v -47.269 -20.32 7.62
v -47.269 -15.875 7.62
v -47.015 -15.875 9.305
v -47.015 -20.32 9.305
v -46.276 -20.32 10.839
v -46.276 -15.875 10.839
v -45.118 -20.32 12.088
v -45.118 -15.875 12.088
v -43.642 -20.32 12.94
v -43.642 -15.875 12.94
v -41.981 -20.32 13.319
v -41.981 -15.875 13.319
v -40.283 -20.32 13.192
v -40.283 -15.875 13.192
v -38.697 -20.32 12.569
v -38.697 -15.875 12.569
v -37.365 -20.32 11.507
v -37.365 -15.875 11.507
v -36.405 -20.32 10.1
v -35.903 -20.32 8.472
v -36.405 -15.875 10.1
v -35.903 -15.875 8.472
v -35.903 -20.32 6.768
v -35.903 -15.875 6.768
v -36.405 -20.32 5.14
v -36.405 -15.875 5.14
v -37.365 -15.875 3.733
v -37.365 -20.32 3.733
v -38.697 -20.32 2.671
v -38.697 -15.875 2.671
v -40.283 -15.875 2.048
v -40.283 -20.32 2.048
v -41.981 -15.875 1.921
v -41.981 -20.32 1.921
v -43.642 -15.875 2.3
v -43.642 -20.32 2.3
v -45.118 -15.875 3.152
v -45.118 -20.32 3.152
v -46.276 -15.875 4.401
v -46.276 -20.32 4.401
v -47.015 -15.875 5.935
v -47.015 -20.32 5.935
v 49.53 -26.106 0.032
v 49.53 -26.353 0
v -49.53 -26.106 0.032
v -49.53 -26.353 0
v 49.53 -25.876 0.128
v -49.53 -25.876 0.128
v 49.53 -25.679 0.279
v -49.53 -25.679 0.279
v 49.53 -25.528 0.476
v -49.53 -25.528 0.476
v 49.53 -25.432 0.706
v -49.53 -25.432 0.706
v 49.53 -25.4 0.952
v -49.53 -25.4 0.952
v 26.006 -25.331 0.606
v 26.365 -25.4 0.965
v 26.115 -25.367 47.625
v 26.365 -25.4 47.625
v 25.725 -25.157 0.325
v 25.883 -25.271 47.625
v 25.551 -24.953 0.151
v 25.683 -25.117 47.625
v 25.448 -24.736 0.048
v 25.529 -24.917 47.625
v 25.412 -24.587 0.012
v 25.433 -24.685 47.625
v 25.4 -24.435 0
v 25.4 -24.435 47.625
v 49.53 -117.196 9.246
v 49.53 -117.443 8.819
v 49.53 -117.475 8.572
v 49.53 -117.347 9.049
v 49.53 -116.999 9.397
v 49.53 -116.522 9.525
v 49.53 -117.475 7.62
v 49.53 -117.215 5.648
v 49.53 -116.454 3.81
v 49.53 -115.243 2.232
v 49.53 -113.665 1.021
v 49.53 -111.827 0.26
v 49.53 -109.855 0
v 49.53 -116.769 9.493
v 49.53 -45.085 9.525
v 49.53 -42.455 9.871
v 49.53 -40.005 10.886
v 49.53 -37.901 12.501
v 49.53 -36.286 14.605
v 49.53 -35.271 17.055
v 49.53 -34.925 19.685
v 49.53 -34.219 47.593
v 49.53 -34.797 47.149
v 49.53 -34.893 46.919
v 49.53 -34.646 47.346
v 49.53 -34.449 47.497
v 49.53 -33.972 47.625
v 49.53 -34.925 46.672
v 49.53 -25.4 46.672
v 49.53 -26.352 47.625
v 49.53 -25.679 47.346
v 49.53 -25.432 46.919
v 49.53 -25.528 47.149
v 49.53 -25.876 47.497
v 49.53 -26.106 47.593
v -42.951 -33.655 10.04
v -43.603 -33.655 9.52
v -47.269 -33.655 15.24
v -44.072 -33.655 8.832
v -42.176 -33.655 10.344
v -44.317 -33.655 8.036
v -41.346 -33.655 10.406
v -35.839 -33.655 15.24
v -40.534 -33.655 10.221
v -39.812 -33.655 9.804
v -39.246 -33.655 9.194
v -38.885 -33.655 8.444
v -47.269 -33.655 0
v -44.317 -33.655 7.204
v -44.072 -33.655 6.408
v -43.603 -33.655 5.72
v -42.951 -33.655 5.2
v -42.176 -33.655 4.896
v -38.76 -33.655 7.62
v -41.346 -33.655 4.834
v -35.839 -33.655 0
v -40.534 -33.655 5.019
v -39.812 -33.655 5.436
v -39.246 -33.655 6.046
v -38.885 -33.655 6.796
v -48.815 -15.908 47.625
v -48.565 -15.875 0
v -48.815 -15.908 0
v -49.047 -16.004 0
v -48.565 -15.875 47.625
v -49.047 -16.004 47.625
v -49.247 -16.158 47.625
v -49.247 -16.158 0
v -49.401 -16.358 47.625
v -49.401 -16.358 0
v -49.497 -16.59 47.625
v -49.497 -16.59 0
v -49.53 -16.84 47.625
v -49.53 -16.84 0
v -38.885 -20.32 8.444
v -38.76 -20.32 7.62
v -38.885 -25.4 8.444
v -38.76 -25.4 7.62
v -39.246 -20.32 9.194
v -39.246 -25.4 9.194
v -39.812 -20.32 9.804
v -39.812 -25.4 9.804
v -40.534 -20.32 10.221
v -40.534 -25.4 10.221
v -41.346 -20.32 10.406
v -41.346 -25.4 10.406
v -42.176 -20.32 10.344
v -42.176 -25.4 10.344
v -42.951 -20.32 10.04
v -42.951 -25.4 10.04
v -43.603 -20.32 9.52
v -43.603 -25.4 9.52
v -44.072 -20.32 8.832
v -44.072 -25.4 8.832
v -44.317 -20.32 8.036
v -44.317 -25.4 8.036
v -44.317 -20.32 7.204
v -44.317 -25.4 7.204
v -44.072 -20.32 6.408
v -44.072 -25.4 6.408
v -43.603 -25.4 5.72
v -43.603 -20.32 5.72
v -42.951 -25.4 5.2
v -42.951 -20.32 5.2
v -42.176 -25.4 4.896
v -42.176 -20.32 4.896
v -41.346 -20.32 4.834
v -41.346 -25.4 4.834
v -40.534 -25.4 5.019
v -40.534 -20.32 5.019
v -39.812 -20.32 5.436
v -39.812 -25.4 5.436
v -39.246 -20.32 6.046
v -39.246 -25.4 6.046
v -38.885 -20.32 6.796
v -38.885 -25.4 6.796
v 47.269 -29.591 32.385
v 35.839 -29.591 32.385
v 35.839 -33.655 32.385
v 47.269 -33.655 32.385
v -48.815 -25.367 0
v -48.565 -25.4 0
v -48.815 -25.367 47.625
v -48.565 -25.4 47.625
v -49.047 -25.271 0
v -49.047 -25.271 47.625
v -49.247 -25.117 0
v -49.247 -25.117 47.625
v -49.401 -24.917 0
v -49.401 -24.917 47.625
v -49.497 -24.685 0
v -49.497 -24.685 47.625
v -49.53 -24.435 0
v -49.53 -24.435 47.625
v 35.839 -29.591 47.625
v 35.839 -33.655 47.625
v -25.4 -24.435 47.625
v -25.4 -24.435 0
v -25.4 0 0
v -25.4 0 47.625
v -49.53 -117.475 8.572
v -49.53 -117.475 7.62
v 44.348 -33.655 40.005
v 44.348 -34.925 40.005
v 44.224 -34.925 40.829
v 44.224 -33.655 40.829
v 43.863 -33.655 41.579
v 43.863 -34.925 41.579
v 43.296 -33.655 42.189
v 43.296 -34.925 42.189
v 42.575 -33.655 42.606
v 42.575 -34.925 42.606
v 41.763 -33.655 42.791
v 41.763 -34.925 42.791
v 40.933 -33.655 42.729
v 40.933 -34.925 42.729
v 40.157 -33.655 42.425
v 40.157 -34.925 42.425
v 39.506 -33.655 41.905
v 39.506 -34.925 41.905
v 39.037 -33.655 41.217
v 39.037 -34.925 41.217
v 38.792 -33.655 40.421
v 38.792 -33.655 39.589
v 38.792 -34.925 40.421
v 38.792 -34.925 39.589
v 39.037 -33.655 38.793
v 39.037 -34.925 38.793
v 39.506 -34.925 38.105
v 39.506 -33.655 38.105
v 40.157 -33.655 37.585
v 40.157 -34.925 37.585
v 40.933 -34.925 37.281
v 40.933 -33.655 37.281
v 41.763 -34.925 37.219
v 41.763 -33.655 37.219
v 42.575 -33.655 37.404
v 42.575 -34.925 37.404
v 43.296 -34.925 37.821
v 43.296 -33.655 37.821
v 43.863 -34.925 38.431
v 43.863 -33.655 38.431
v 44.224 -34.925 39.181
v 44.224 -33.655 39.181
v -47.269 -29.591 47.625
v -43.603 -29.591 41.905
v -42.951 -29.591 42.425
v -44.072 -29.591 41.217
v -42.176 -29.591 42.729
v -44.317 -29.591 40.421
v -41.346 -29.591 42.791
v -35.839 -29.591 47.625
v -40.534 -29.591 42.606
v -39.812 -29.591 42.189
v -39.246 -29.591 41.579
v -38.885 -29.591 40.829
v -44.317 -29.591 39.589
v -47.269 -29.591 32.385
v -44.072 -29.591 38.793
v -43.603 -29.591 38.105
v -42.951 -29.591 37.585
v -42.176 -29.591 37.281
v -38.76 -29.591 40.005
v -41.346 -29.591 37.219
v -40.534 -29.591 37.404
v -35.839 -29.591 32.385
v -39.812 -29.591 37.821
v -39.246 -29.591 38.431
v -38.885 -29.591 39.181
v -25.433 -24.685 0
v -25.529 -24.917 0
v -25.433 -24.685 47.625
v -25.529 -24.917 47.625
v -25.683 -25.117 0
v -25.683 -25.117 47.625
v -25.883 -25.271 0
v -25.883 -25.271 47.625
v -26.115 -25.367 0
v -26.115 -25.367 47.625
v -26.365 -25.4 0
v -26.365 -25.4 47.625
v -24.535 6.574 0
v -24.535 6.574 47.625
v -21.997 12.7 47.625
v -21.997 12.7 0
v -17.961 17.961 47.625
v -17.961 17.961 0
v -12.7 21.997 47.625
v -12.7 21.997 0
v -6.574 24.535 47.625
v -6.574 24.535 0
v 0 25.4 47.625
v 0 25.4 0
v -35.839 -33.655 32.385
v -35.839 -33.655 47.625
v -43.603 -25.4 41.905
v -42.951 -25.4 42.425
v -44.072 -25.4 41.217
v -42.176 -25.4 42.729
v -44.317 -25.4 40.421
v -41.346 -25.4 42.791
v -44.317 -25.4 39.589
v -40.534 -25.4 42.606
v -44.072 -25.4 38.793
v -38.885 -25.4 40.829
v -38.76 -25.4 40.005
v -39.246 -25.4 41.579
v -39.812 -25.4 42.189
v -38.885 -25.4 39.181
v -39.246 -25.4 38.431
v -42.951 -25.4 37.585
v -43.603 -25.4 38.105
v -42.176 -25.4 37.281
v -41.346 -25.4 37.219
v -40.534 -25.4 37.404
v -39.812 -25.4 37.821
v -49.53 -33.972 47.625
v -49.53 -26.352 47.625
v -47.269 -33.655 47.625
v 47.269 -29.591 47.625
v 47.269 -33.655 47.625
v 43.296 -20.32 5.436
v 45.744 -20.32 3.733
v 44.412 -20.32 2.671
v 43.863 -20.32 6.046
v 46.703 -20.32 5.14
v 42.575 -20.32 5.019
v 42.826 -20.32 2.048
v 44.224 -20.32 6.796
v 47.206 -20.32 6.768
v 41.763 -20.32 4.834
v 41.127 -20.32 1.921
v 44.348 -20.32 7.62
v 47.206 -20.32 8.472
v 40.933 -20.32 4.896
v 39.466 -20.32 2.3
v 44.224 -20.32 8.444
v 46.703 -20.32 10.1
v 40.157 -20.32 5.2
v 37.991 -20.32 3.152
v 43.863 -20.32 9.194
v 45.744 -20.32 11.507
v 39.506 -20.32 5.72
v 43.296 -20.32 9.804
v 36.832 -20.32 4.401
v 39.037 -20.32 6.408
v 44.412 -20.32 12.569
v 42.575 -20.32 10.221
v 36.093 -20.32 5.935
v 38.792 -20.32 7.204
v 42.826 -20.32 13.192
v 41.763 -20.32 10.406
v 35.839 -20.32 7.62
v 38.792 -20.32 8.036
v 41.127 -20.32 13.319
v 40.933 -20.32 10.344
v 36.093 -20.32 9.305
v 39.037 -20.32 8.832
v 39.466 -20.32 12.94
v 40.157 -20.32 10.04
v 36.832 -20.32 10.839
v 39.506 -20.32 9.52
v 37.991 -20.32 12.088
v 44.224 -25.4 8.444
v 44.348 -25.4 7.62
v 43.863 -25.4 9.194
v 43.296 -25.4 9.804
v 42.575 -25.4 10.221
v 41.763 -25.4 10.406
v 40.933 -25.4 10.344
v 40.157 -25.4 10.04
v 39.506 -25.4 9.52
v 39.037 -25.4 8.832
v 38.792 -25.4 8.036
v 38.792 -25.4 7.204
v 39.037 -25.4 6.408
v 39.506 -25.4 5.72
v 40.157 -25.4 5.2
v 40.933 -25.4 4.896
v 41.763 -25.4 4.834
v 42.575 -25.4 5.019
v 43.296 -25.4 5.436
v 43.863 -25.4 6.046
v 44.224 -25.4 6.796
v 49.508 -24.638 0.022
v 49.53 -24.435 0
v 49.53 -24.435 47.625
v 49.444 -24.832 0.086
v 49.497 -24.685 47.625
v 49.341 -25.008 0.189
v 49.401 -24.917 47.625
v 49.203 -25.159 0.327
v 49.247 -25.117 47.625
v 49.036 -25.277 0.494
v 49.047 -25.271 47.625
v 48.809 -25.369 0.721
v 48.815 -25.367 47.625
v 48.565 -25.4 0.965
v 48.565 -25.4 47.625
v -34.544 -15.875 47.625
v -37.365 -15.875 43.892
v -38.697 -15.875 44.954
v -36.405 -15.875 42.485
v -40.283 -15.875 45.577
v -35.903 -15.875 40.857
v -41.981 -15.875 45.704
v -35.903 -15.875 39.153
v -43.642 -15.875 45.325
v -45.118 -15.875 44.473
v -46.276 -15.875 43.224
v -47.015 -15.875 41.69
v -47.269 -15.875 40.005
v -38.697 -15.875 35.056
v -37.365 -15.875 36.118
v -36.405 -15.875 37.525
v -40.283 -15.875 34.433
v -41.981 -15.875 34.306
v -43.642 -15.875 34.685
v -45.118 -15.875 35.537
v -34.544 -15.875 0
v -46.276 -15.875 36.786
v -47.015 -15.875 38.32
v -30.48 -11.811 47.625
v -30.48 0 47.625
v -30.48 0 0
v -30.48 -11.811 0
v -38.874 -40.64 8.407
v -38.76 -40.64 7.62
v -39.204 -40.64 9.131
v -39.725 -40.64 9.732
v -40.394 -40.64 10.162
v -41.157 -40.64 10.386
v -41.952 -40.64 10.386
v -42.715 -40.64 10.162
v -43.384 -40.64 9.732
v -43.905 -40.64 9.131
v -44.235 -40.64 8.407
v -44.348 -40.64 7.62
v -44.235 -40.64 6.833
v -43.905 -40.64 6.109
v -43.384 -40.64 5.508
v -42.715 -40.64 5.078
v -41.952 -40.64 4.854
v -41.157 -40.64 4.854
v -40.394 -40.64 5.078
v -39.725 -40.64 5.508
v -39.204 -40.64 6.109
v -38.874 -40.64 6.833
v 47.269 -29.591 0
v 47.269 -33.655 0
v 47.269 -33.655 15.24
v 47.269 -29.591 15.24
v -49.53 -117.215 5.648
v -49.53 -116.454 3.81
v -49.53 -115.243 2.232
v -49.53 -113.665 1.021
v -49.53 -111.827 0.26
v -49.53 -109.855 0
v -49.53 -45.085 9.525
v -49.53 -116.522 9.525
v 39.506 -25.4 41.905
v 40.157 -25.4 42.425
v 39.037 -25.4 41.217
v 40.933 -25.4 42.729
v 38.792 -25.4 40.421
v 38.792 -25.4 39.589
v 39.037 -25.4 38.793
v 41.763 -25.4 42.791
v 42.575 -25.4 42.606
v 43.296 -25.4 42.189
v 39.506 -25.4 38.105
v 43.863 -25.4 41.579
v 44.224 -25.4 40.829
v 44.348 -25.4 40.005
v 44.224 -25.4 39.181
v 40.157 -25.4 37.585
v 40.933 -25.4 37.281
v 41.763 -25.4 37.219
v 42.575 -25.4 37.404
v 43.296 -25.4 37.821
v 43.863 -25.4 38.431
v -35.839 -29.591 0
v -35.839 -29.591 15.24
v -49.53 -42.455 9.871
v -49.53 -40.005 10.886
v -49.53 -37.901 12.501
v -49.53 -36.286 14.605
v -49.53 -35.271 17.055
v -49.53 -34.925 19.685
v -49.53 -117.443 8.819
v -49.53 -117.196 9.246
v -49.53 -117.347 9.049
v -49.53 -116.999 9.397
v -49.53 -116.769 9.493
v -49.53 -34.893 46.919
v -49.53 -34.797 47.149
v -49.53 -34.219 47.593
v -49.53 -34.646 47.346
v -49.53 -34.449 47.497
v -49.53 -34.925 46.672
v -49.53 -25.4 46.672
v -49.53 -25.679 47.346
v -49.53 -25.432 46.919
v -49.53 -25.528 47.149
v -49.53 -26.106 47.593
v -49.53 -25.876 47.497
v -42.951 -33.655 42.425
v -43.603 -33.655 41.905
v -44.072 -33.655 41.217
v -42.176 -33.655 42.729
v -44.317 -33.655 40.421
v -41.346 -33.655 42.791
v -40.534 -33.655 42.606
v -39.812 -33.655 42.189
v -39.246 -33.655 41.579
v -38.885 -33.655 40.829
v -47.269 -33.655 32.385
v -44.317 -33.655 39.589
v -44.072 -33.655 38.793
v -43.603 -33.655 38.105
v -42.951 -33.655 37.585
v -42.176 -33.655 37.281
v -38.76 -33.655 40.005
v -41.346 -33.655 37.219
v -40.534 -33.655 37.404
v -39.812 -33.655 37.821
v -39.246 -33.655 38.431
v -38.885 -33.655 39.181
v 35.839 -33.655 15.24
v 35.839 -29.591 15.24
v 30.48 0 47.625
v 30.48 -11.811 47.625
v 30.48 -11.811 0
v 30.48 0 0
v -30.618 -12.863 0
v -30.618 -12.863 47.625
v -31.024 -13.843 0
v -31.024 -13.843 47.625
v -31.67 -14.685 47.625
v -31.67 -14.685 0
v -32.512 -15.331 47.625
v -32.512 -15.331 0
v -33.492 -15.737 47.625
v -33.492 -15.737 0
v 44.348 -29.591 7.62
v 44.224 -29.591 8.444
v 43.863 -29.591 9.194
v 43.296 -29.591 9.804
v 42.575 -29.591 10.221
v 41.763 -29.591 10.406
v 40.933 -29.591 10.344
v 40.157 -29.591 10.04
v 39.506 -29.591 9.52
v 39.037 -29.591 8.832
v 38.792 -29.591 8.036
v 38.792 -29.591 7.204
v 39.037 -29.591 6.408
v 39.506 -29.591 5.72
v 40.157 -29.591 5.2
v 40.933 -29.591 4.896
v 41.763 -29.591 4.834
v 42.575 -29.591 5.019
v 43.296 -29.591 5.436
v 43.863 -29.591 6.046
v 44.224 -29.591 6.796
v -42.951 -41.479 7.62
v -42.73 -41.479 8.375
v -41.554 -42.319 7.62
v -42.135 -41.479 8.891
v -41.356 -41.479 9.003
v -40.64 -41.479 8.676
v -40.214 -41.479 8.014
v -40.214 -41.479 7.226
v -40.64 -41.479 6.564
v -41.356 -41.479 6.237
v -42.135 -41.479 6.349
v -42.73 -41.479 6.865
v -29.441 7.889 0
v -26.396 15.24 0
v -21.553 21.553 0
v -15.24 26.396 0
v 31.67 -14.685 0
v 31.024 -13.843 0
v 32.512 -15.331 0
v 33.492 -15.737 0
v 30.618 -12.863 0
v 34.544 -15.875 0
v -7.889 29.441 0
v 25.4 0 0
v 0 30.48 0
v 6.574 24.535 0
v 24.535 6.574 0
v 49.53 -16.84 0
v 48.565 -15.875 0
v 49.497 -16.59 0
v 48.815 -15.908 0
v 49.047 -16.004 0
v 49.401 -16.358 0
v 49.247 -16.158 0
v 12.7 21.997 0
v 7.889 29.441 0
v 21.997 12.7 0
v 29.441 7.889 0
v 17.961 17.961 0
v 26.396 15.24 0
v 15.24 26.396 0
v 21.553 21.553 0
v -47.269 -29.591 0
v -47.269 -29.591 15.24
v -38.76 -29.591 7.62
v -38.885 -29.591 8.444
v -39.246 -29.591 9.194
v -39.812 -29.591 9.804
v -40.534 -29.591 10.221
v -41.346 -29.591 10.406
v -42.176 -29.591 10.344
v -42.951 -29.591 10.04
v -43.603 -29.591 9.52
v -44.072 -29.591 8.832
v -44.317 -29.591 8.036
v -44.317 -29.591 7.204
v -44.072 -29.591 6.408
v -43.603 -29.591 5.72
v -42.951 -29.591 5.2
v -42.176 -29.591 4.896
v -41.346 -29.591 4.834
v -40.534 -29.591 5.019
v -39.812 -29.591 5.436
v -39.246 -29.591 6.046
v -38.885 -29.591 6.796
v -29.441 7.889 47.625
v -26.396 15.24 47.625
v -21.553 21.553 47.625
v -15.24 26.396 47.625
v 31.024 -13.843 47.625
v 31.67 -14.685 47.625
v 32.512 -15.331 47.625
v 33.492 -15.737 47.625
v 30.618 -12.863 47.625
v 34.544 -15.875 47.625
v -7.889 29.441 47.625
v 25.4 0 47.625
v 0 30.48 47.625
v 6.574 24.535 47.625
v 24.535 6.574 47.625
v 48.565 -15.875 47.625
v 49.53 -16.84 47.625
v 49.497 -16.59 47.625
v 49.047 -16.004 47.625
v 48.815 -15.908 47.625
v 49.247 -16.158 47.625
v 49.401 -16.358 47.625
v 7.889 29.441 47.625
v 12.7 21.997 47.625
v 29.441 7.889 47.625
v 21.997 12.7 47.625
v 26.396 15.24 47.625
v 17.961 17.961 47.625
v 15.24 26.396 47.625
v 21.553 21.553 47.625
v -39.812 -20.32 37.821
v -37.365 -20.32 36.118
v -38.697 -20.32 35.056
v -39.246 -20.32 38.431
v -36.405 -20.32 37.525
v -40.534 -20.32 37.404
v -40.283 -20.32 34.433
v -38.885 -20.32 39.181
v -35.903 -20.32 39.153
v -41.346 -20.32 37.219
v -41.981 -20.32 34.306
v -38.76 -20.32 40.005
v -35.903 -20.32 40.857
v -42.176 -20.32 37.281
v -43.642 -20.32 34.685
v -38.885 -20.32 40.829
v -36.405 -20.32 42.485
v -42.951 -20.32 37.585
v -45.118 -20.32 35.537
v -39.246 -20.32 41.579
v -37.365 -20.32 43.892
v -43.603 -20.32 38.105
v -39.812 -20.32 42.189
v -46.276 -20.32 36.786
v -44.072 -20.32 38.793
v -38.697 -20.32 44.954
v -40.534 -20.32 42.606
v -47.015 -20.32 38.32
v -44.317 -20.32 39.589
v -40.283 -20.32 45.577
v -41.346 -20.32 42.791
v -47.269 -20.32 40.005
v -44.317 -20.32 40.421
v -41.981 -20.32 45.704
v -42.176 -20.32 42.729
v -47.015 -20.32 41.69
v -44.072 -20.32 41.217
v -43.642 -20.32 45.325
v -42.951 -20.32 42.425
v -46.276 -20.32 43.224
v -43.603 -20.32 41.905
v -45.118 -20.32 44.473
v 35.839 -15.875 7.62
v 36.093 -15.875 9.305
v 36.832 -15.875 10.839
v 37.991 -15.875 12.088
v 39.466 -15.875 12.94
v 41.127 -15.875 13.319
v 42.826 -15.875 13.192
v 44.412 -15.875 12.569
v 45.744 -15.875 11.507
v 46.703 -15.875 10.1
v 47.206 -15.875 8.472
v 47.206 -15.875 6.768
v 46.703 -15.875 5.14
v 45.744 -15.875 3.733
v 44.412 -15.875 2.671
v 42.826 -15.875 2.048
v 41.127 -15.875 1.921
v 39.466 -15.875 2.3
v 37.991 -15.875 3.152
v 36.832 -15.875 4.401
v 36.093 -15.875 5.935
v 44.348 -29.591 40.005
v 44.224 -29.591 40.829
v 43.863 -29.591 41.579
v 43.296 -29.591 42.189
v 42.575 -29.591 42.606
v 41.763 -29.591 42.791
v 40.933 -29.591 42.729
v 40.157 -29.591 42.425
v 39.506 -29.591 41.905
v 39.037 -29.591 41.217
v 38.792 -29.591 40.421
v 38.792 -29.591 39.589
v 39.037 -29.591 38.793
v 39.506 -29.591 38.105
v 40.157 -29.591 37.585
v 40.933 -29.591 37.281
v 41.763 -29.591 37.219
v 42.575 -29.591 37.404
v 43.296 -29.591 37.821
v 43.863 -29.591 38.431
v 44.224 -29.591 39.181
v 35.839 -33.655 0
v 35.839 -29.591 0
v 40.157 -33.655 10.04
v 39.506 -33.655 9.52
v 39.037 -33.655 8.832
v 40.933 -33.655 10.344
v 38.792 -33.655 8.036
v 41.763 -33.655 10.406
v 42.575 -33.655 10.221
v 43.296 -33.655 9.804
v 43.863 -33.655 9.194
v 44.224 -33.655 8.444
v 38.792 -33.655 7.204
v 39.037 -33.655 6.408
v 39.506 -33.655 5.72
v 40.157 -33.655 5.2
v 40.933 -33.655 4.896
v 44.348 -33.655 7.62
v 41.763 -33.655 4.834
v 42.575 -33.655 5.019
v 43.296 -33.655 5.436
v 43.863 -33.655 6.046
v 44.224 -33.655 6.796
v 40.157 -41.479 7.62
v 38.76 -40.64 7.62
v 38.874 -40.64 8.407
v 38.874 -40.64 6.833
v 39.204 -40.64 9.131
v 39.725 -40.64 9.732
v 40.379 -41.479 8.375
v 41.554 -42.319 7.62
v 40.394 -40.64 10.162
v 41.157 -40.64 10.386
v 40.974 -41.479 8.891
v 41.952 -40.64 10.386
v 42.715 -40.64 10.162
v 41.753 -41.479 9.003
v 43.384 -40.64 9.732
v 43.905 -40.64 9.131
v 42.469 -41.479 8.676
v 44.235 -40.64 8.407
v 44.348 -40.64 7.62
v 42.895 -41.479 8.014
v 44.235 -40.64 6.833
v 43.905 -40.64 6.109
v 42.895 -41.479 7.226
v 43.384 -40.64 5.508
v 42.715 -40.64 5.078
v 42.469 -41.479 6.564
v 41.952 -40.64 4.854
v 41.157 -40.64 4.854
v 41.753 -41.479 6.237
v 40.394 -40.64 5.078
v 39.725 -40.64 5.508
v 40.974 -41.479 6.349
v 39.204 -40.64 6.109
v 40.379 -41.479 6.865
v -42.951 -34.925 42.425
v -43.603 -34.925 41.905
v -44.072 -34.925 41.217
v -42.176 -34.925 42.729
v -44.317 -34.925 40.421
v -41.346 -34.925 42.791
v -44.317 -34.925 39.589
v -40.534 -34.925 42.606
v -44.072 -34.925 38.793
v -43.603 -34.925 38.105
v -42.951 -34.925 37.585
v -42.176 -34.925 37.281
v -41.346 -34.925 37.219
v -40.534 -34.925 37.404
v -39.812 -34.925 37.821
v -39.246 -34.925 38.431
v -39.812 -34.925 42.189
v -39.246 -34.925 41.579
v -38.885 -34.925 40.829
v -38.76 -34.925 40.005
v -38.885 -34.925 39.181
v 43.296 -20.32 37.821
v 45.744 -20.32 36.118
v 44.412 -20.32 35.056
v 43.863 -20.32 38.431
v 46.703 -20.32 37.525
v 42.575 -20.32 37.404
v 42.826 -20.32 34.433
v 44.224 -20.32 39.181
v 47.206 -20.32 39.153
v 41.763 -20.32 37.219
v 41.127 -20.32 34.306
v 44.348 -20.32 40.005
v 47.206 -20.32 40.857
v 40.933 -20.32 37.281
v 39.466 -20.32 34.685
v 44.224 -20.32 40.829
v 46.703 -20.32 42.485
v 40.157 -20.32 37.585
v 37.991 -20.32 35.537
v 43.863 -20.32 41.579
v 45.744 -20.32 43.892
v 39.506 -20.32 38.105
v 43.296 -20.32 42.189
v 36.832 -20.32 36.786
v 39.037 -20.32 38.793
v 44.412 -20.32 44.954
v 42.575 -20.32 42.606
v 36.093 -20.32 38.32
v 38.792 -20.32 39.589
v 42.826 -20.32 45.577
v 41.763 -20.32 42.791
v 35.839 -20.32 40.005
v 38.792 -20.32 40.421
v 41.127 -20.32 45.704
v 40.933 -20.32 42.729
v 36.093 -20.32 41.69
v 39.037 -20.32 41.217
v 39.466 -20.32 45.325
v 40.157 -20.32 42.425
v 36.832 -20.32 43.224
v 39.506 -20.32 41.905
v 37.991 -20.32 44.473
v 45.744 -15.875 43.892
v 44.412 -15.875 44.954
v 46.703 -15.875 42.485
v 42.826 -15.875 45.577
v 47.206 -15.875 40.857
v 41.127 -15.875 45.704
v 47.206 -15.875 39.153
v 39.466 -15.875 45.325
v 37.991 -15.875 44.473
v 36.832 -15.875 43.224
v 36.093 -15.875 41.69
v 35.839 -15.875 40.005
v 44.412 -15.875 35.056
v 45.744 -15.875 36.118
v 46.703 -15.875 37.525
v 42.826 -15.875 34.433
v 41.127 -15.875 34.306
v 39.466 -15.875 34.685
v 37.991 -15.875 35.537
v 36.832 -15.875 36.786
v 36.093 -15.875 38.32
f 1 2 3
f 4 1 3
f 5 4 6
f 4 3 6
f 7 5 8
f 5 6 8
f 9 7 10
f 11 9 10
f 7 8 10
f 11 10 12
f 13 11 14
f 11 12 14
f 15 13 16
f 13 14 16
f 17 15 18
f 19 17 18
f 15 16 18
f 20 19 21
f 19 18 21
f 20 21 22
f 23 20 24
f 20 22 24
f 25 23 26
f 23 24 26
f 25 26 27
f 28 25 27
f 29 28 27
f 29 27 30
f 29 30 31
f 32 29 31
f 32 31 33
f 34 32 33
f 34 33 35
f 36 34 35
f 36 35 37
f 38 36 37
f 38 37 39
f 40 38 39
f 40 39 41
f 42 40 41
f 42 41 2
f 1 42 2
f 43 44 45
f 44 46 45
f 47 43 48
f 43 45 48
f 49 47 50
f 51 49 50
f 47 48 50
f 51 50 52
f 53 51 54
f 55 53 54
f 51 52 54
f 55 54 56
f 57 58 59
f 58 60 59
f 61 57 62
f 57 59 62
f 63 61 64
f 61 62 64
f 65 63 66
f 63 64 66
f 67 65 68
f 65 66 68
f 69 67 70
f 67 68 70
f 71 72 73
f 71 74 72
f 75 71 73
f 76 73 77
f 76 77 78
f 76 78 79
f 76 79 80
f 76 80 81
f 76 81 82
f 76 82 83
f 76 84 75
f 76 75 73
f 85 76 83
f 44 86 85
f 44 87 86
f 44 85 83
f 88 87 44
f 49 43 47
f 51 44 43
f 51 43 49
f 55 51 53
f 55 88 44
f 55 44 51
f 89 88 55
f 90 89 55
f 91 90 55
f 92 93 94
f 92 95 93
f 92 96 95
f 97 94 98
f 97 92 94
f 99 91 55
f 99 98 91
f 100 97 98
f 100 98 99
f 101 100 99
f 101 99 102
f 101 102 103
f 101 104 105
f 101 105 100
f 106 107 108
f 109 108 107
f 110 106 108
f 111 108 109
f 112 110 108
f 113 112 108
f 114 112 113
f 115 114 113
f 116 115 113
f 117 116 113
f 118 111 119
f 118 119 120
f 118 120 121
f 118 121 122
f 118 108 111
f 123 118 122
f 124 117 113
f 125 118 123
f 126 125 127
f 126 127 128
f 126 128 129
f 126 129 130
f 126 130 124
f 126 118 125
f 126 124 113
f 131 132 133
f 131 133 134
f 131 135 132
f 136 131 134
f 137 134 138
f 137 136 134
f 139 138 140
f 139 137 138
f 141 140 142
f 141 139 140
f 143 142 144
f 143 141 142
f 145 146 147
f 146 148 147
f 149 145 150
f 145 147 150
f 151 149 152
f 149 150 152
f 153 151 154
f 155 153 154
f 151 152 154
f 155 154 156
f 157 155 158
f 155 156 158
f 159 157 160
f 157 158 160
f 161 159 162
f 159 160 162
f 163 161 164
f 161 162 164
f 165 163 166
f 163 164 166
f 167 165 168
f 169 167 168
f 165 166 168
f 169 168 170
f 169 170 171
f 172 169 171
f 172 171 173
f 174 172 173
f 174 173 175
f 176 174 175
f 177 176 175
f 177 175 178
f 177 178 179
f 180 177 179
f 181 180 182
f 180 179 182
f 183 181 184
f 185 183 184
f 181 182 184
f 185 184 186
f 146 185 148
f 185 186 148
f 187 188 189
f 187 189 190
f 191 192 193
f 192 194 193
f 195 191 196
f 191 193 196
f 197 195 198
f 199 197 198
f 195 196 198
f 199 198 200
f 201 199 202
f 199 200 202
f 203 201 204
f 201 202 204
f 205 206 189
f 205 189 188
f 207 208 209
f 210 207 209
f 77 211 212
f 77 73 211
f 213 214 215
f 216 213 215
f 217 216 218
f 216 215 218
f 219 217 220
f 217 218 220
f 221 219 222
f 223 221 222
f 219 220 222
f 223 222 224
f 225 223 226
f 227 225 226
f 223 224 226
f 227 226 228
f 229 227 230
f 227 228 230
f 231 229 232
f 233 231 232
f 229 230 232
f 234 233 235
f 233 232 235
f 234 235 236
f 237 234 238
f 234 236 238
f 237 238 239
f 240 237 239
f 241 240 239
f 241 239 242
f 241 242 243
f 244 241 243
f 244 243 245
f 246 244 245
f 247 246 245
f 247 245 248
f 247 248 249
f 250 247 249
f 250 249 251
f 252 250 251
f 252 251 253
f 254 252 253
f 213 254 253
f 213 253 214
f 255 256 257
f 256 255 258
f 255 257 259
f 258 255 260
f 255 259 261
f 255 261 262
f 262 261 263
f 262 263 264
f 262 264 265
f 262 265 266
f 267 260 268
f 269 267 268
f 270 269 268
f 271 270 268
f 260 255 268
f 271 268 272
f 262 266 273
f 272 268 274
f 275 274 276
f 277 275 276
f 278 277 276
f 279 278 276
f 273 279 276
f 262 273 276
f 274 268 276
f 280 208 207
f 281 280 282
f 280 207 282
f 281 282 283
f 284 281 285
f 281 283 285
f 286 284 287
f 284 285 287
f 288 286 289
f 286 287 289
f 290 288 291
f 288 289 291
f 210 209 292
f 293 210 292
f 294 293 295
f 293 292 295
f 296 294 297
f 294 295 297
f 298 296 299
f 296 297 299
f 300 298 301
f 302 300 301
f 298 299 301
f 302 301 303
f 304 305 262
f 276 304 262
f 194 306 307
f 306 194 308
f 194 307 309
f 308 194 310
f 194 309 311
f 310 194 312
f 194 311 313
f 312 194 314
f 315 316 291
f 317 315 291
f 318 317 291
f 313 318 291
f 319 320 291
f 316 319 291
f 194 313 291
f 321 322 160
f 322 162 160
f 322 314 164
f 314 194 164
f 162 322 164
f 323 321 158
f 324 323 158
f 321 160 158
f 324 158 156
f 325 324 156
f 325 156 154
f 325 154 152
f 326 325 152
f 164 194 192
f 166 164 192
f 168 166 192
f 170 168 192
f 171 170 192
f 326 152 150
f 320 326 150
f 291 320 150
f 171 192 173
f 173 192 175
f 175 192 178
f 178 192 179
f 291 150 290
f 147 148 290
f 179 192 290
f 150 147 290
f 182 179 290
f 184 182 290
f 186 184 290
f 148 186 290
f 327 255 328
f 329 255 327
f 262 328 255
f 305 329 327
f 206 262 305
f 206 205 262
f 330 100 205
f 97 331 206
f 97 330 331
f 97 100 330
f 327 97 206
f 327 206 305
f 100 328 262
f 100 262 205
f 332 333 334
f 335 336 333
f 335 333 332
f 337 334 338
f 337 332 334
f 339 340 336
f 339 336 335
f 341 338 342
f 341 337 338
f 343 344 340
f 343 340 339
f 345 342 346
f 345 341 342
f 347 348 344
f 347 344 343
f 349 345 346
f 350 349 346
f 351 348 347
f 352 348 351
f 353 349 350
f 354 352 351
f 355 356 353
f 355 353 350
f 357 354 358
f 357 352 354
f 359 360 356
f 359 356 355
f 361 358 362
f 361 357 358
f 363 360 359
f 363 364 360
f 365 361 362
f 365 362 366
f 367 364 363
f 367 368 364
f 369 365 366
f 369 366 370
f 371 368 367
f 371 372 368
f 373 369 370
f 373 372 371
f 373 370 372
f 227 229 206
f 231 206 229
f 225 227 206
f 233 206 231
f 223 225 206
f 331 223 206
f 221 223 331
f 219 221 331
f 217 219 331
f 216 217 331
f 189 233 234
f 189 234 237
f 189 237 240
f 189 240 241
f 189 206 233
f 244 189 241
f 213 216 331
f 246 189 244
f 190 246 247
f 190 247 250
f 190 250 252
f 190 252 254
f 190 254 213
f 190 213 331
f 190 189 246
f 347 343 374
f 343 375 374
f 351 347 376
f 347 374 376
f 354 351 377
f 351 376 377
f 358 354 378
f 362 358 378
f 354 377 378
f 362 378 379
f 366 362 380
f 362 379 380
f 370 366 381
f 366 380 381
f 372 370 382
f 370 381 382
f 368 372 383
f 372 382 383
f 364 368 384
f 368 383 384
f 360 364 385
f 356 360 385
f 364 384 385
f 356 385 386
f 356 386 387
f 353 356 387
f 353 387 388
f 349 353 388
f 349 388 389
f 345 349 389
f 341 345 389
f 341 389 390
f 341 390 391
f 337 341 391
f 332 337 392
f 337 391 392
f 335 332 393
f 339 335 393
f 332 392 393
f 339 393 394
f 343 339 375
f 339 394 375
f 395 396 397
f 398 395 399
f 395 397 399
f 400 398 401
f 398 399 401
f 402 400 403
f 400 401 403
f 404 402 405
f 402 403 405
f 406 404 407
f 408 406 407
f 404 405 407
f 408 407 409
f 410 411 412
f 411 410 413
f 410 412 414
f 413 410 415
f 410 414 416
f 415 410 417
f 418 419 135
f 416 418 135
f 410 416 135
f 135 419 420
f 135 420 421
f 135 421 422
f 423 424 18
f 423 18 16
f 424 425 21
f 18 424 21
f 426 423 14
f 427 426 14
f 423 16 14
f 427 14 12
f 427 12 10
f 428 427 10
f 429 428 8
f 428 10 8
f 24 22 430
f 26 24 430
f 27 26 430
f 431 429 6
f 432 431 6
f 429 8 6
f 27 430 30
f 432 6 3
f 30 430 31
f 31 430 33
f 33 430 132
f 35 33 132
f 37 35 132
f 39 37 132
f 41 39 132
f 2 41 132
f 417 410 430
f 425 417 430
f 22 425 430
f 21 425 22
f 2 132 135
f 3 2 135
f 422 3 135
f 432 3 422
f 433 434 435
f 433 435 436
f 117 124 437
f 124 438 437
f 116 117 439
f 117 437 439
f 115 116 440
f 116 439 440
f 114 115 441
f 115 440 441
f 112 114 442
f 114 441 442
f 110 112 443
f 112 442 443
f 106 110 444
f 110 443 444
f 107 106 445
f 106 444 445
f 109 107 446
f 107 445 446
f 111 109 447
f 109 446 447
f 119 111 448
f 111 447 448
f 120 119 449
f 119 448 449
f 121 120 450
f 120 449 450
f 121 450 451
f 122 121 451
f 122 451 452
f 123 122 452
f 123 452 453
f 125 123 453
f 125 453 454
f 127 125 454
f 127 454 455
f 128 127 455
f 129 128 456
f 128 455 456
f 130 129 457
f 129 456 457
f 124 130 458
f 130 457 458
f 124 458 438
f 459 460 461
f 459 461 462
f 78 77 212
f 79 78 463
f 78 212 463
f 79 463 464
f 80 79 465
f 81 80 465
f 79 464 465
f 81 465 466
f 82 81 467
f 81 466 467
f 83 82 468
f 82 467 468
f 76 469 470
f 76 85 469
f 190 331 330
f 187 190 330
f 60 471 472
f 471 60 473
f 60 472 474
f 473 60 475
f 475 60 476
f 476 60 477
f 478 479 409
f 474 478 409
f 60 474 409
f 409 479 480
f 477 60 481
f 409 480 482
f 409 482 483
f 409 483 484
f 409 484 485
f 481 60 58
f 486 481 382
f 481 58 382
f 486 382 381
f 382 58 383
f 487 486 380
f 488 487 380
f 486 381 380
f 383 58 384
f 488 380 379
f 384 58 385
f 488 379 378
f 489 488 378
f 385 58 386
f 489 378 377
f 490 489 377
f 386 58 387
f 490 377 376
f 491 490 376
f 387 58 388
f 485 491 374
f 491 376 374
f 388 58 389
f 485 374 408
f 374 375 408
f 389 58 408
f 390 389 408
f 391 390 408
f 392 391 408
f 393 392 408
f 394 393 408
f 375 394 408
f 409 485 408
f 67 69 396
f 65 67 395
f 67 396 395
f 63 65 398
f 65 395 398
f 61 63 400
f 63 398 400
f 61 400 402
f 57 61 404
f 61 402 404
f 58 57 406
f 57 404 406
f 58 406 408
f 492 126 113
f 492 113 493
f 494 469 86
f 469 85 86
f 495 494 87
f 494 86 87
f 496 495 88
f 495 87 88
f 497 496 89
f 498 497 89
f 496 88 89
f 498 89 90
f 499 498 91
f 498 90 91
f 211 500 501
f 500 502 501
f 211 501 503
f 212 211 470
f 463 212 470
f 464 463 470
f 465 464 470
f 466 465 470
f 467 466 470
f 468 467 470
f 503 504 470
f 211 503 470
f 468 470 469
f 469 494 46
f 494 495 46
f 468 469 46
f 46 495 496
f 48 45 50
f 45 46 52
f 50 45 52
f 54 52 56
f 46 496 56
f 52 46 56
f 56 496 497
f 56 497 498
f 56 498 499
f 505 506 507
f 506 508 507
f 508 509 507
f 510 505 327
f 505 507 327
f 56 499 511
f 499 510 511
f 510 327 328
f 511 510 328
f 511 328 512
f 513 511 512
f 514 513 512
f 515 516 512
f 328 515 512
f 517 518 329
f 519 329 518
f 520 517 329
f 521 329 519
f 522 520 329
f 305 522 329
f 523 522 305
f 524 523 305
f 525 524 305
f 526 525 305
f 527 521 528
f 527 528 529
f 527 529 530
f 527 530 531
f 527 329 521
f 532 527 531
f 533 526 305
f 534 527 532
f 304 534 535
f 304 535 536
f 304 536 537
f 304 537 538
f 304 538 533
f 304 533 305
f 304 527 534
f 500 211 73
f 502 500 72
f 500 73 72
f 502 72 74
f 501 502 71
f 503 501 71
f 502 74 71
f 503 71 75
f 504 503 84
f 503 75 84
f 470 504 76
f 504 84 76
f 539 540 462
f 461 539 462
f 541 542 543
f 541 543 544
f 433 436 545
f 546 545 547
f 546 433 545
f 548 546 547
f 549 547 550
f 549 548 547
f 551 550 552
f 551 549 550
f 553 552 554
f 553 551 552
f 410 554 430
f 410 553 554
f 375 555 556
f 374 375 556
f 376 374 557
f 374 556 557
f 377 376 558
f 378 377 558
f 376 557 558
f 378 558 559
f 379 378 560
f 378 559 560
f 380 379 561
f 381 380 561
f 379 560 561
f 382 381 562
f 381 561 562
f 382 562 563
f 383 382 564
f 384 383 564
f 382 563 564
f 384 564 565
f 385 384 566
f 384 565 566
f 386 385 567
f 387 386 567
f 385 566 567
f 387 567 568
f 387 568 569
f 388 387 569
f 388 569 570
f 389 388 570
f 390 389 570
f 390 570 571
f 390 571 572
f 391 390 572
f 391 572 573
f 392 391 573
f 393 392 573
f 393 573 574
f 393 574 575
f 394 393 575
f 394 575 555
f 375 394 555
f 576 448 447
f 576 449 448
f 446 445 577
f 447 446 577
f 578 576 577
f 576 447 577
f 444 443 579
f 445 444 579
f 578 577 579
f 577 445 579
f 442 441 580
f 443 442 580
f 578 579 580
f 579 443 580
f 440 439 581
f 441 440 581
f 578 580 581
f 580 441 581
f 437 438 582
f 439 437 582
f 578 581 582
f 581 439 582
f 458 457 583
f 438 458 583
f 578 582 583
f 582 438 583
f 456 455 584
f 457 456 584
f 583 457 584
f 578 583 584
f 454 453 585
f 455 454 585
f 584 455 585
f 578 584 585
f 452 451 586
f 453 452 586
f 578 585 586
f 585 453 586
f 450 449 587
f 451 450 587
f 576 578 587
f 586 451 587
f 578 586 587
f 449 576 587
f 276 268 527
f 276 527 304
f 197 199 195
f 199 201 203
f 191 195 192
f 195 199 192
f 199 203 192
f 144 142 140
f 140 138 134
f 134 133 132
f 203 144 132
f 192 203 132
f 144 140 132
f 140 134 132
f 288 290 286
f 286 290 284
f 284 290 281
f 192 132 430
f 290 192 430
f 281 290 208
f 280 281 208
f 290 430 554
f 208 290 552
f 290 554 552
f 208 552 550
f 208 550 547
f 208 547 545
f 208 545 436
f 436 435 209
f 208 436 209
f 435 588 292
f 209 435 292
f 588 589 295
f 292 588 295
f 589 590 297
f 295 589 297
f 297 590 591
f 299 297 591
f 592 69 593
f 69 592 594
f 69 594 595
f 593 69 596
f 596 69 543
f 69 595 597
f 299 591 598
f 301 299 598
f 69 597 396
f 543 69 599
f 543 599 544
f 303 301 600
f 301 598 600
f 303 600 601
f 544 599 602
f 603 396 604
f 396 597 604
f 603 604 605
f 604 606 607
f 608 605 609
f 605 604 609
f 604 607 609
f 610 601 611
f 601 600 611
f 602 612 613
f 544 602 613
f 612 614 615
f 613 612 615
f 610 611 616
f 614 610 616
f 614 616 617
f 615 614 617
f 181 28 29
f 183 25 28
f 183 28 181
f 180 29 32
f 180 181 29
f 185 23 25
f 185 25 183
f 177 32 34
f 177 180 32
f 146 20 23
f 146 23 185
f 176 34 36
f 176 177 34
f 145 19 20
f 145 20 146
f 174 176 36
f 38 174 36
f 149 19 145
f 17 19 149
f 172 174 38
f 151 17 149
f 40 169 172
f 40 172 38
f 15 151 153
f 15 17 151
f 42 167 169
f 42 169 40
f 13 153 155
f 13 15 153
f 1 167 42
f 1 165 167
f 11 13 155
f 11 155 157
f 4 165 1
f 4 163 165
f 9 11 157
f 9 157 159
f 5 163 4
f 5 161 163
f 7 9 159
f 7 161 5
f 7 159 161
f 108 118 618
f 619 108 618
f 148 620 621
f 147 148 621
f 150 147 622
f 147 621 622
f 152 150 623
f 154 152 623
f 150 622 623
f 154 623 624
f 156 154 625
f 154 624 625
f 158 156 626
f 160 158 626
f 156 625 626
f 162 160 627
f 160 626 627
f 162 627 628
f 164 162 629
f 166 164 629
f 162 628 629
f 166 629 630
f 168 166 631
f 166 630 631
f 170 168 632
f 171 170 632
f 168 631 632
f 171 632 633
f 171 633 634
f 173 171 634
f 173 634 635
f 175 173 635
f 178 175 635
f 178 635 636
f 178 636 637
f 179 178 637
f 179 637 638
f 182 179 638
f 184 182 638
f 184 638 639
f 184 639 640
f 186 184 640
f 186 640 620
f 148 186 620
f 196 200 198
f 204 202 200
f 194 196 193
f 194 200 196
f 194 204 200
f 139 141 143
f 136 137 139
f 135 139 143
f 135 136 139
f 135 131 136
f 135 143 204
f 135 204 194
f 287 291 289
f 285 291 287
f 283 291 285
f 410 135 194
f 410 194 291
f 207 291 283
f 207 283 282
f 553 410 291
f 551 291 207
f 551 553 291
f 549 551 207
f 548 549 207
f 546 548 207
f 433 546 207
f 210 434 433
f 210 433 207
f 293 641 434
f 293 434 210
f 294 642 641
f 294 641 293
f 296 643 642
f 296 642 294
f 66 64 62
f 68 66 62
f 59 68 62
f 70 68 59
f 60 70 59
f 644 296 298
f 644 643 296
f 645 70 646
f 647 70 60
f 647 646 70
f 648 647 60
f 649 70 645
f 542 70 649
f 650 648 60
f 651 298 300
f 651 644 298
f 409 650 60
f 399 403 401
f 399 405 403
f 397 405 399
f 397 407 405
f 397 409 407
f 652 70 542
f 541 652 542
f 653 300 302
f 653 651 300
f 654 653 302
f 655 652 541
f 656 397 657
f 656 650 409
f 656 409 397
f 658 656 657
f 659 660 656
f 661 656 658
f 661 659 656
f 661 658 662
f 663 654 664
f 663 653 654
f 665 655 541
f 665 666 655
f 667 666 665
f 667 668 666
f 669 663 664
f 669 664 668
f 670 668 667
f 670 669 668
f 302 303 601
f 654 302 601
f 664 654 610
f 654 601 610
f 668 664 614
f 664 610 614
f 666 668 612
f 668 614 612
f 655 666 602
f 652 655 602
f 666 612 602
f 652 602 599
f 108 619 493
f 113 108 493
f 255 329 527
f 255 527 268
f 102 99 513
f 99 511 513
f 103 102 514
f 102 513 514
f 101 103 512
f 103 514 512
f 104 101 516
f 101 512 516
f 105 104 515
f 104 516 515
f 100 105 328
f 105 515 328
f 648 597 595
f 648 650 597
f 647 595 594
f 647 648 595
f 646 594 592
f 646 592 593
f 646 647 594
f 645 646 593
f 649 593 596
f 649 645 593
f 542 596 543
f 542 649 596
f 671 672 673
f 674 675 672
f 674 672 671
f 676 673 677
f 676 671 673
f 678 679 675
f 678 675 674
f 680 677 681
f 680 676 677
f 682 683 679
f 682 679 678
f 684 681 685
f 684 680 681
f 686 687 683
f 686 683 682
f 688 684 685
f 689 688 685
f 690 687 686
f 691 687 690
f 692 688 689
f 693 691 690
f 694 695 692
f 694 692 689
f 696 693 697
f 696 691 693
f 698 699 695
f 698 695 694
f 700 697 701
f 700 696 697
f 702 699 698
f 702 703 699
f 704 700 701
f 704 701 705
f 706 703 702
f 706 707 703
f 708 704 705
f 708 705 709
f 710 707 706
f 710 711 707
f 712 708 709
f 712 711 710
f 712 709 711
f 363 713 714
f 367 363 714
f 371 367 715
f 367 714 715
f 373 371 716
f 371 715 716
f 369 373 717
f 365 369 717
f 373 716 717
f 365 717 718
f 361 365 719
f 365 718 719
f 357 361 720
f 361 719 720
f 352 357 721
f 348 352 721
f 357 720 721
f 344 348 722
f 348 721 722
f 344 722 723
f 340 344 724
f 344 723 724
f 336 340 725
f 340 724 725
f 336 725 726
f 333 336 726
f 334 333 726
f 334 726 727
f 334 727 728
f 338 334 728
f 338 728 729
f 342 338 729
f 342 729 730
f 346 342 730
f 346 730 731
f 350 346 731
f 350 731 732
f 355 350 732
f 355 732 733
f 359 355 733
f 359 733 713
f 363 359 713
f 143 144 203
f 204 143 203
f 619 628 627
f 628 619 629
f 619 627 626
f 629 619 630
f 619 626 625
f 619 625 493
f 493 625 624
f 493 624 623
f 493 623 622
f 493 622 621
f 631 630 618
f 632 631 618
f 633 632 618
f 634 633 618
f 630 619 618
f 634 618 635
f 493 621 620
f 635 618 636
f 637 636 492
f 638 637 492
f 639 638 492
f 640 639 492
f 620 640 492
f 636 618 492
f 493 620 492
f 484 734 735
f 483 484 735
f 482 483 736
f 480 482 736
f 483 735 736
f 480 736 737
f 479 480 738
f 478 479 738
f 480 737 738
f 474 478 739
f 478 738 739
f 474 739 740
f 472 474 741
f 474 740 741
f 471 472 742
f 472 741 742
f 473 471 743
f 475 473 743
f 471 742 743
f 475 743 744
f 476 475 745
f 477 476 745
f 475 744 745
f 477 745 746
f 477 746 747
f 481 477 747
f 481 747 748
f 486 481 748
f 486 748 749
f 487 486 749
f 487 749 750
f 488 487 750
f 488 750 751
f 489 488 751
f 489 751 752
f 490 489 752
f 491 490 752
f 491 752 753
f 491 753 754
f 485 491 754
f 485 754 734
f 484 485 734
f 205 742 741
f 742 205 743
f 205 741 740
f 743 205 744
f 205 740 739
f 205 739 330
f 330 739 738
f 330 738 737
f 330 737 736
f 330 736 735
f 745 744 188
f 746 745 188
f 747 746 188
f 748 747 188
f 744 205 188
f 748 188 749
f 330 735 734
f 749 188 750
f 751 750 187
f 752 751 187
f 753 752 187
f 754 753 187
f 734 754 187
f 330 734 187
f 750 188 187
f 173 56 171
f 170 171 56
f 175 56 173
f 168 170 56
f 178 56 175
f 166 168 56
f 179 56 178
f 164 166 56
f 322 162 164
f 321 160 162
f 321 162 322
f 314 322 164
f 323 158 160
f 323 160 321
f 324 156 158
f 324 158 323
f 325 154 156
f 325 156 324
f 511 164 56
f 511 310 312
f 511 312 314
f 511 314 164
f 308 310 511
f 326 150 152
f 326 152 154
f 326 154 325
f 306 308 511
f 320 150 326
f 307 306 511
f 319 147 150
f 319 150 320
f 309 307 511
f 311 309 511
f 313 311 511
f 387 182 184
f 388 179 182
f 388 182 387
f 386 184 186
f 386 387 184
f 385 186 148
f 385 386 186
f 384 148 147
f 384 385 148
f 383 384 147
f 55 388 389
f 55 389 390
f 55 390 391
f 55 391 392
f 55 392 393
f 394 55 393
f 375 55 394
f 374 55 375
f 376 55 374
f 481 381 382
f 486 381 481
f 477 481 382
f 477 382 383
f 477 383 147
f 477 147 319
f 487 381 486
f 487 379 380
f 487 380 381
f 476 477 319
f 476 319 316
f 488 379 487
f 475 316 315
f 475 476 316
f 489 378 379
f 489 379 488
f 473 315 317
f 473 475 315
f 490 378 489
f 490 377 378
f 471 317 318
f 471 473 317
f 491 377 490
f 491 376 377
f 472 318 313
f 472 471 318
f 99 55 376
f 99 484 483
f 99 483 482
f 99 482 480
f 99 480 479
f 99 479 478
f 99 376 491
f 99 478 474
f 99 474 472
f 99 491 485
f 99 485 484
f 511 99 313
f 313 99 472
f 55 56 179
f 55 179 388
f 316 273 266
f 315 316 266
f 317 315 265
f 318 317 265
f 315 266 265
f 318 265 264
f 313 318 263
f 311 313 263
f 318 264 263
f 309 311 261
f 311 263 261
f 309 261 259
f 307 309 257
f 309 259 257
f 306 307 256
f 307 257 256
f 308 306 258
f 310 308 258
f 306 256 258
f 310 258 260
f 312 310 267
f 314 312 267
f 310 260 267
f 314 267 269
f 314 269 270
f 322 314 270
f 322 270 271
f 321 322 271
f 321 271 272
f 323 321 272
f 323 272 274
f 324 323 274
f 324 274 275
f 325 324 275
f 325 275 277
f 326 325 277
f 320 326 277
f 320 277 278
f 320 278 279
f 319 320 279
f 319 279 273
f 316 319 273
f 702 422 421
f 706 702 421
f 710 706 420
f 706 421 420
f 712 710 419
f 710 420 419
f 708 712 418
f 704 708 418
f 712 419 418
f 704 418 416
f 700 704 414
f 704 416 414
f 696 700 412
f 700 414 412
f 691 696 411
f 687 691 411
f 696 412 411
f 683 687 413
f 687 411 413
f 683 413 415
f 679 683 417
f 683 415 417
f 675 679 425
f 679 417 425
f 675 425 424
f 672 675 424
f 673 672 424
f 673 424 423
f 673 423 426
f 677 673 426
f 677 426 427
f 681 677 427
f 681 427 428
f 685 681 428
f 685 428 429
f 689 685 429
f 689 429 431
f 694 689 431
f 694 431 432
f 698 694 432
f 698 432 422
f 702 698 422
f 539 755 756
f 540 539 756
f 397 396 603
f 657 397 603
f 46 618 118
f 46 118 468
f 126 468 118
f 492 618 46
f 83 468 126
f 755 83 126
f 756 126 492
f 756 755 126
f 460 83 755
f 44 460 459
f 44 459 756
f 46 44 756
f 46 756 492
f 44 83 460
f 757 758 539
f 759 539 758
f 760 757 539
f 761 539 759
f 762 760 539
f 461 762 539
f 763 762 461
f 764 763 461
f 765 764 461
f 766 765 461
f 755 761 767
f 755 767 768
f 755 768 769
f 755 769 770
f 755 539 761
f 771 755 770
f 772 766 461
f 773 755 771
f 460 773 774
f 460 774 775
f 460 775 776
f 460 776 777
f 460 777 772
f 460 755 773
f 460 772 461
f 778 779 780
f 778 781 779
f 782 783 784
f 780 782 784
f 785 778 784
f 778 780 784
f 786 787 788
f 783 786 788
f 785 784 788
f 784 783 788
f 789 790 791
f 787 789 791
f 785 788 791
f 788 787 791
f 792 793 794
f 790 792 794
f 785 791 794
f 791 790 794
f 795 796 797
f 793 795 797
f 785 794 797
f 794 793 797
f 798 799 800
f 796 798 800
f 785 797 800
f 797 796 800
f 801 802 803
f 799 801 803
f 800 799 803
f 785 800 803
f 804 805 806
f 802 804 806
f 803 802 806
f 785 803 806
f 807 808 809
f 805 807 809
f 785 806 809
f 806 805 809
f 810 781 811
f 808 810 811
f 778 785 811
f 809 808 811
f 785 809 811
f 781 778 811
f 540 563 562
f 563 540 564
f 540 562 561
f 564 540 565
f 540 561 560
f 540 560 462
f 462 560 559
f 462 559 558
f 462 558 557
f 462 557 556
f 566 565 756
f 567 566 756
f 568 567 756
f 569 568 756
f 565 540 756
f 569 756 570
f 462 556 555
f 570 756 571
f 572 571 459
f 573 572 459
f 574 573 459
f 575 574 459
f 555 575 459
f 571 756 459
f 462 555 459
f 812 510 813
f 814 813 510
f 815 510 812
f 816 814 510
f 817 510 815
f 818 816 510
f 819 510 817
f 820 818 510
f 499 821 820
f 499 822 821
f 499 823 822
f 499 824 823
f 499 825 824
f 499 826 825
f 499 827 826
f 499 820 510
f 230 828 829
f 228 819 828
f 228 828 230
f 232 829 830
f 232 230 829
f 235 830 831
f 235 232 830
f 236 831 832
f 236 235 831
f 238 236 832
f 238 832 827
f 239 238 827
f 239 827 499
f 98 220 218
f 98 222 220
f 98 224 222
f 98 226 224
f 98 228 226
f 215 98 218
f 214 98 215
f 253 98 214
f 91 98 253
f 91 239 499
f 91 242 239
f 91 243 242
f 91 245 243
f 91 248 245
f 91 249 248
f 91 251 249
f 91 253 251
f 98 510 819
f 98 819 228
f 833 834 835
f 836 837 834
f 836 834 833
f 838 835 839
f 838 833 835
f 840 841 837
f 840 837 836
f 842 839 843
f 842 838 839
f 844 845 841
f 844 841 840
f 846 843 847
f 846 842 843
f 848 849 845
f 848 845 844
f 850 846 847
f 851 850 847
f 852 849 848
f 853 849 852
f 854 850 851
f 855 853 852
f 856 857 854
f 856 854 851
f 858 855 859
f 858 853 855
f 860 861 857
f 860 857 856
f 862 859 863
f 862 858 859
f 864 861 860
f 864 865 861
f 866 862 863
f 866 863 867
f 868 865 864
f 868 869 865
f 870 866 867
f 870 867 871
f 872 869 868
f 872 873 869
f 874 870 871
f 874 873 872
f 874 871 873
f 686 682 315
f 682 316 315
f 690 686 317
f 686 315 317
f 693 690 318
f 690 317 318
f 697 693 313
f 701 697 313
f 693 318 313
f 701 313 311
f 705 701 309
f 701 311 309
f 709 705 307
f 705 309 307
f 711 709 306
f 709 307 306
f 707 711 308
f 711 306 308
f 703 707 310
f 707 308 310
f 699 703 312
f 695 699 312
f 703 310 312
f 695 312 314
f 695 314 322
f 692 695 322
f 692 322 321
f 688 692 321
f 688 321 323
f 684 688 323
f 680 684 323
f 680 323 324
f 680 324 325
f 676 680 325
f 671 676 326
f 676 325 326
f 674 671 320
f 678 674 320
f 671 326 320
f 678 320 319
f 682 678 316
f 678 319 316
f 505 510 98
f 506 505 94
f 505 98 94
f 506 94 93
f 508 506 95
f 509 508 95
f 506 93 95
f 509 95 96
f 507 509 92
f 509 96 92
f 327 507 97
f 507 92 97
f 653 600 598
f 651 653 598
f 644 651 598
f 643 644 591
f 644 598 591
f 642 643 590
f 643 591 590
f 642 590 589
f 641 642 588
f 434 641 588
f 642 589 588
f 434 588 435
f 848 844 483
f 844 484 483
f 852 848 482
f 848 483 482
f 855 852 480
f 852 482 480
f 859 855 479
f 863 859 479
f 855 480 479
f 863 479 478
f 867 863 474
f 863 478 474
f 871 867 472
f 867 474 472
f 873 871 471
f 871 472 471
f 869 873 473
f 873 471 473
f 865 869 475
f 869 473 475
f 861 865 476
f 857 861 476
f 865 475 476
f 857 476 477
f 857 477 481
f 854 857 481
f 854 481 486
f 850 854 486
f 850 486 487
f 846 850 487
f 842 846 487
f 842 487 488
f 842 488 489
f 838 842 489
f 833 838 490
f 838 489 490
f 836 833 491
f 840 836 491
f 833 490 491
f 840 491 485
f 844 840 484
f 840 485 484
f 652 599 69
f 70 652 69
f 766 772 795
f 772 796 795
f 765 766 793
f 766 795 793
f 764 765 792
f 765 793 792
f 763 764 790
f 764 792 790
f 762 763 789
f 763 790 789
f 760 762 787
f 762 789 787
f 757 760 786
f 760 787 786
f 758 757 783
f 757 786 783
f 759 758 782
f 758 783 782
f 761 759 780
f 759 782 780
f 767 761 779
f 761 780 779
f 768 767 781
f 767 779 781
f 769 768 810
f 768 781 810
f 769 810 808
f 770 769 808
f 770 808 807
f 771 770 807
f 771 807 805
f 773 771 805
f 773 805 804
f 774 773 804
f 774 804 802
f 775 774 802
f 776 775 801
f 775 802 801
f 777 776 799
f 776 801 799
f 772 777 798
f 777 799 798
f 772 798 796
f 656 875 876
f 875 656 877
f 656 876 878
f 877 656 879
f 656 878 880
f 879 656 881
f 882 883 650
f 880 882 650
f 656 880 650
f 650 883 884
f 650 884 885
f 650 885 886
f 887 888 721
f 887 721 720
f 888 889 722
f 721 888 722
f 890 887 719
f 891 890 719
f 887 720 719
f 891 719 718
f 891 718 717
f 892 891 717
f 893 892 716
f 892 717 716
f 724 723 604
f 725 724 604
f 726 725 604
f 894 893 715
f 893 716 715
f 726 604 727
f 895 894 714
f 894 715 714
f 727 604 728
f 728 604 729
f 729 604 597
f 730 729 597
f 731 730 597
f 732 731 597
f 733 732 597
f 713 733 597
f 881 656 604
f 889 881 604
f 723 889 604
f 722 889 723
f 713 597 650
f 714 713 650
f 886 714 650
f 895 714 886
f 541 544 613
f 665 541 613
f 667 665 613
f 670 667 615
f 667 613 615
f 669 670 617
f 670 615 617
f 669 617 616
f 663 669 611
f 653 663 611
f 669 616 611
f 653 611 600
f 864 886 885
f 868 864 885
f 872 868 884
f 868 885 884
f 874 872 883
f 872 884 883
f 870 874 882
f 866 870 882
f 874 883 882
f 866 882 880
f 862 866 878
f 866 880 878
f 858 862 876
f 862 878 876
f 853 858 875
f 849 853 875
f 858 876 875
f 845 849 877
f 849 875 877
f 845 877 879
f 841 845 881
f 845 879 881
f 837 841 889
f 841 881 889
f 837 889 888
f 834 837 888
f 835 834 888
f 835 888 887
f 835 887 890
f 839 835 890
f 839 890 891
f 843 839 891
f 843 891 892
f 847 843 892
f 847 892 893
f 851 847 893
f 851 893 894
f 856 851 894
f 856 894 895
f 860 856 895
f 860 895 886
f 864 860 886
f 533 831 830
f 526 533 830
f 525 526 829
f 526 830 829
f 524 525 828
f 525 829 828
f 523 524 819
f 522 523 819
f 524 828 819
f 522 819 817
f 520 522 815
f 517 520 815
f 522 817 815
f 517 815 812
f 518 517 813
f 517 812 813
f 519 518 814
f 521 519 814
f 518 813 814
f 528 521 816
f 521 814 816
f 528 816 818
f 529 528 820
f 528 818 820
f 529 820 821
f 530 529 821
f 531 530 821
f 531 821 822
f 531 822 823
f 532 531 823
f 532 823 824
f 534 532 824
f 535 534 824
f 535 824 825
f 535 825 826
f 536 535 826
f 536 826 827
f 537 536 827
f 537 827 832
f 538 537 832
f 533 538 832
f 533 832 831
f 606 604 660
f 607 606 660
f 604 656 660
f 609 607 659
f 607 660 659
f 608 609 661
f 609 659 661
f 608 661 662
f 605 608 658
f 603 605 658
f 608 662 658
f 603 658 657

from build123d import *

# Parameters (mm, degrees)
F1_DEPTH       = 47.625
F2_R           = 4.064
F3_R           = 0.9652
F5_D           = 5.588
F5_CBORE_D     = 11.43
F5_CBORE_DEPTH = 4.445
F7_DEPTH       = 49.53
F8_R           = 10.16
F9_R           = 7.62
F10_R          = 0.9525
F11_W          = 11.43
F11_H          = 4.064
F12_DEPTH      = 15.24
F13_D          = 5.588
F13_DEPTH      = 15.24
F13_START      = 9.525
F13_TIP        = 1.6788045696
F14_D          = 5.588
F15_START      = 32.385
F15_DEPTH      = 15.24


with BuildPart() as f1:
    # F0 (on Top) → F1 (new body)
    with BuildSketch(Plane.XY):
        with BuildLine():
            Line((-25.4, -25.4), (-25.4, 0))
            ThreePointArc((-25.4, 0), (-17.9605122421, 17.9605122421), (0, 25.4))
            Line((0, 25.4), (0, 30.48))
            ThreePointArc((0, 30.48), (-21.5526146906, 21.5526146906), (-30.48, 0))
            Line((-30.48, 0), (-30.48, -15.875))
            Line((-30.48, -15.875), (-49.53, -15.875))
            Line((-49.53, -15.875), (-49.53, -25.4))
            Line((-49.53, -25.4), (-25.4, -25.4))
        make_face()
        with BuildLine():
            Line((0, 30.48), (0, 25.4))
            ThreePointArc((0, 25.4), (17.9605122421, 17.9605122421), (25.4, 0))
            Line((25.4, 0), (25.4, -25.4))
            Line((25.4, -25.4), (49.53, -25.4))
            Line((49.53, -25.4), (49.53, -15.875))
            Line((49.53, -15.875), (30.48, -15.875))
            Line((30.48, -15.875), (30.48, 0))
            ThreePointArc((30.48, 0), (21.5526146906, 21.5526146906), (0, 30.48))
        make_face()
    extrude(amount=F1_DEPTH)

    # F2
    f2_edges = [f1.edges().sort_by_distance(p)[0] for p in [
        (-30.48, -15.875, 23.8125),
        (30.48, -15.875, 23.8125),
    ]]
    fillet(f2_edges, radius=F2_R)

    # F3
    f3_edges = [f1.edges().sort_by_distance(p)[0] for p in [
        (49.53, -15.875, 23.8125),
        (49.53, -25.4, 23.8125),
        (25.4, -25.4, 23.8125),
        (37.465, -25.4, 0),
        (-25.4, -25.4, 23.8125),
        (-49.53, -25.4, 23.8125),
        (-49.53, -15.875, 23.8125),
    ]]
    fillet(f3_edges, radius=F3_R)

    # F5 (through all)
    with Locations(Plane(origin=(0, -15.875, 0), x_dir=(-1, 0, 0), z_dir=(0, 1, 0))):
        with Locations((-41.5544, 40.005), (-41.5544, 7.62), (41.5544, 40.005), (41.5544, 7.62)):
            CounterBoreHole(F5_D / 2, F5_CBORE_D / 2, F5_CBORE_DEPTH)


with BuildPart() as f7:
    # F6 (on Right) → F7 (new body, symmetric)
    with BuildSketch(Plane.YZ):
        Polygon((-25.4, 47.625), (-34.925, 47.625), (-34.925, 9.525), (-117.475, 9.525), (-117.475, 0), (-25.4, 0), align=None)
    extrude(amount=F7_DEPTH, both=True)

    # F8
    f8_edges = [f7.edges().sort_by_distance(p)[0] for p in [
        (0, -34.925, 9.525),
    ]]
    fillet(f8_edges, radius=F8_R)

    # F9
    f9_edges = [f7.edges().sort_by_distance(p)[0] for p in [
        (0, -117.475, 0),
    ]]
    fillet(f9_edges, radius=F9_R)

    # F10
    f10_edges = [f7.edges().sort_by_distance(p)[0] for p in [
        (0, -117.475, 9.525),
        (0, -34.925, 47.625),
        (0, -25.4, 47.625),
        (0, -25.4, 0),
    ]]
    fillet(f10_edges, radius=F10_R)

    # F11 (on Top) → F12 (cut)
    with BuildSketch(Plane.XY):
        with Locations((41.5544, -31.623)):
            Rectangle(F11_W, F11_H)
        with Locations((-41.5544, -31.623)):
            Rectangle(F11_W, F11_H)
    extrude(amount=F12_DEPTH, mode=Mode.SUBTRACT)

    # F13
    # its depths count from where the whole tool has entered the part; down to there all is cleared
    with Locations(Plane(origin=(0, -15.875, 0), x_dir=(-1, 0, 0), z_dir=(0, 1, 0)).offset(-F13_START)):
        with Locations((-41.5544, 7.62), (41.5544, 7.62)):
            Hole(F13_D / 2, depth=F13_DEPTH)
            with Locations((0, 0, -(F13_DEPTH + F13_TIP / 2))):  # 118° drill point
                Cone(0, F13_D / 2, F13_TIP, mode=Mode.SUBTRACT)

    # F14 (through all)
    with Locations(Plane(origin=(0, -15.875, 0), x_dir=(-1, 0, 0), z_dir=(0, 1, 0))):
        with Locations((-41.5544, 40.005), (41.5544, 40.005)):
            Hole(F14_D / 2)

    # F11 (on Top) → F15 (cut)
    with BuildSketch(Plane.XY.offset(F15_START)):
        with Locations((41.5544, -31.623)):
            Rectangle(F11_W, F11_H)
        with Locations((-41.5544, -31.623)):
            Rectangle(F11_W, F11_H)
    extrude(amount=F15_DEPTH, mode=Mode.SUBTRACT)


solid = Compound([f1.part, f7.part])
